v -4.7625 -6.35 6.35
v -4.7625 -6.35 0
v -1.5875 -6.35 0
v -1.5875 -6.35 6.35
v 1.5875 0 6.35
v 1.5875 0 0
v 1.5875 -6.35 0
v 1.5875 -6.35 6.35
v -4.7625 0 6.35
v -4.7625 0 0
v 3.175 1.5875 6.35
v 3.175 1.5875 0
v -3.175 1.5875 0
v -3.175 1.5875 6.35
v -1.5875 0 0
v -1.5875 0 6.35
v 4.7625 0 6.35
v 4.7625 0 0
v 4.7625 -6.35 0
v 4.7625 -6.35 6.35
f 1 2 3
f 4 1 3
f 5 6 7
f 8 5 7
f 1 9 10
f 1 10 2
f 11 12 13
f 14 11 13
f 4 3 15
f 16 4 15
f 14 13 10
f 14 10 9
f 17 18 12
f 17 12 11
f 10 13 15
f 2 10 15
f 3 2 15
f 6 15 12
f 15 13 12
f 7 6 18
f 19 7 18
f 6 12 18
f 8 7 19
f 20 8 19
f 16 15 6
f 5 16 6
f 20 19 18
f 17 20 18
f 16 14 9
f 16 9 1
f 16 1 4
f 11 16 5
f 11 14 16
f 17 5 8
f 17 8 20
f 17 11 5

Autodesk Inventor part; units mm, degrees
ref_plane "YZ Plane" through (0, 0, 0) normal (1, 0, 0) x (0, 1, 0)
ref_plane "XZ Plane" through (0, 0, 0) normal (0, 1, 0) x (-1, 0, 0)
ref_plane "XY Plane" through (0, 0, 0) normal (0, 0, 1) x (1, 0, 0)
sketch "Sketch1" plane through (0, 0, 0) normal (0, 0, 1) x (1, 0, 0)
  line L0 (-4.7625, -6.35) -> (-1.5875, -6.35)
  line L1 (-1.5875, -6.35) -> (-1.5875, 0)
  line L2 (-1.5875, 0) -> (1.5875, 0)
  line L3 (1.5875, 0) -> (1.5875, -6.35)
  line L4 (1.5875, -6.35) -> (4.7625, -6.35)
  line L5 (4.7625, -6.35) -> (4.7625, 1.5875)
  line L6 (4.7625, 1.5875) -> (-4.7625, 1.5875)
  line L7 (-4.7625, 1.5875) -> (-4.7625, -6.35)
  point P0 (0, 0)
  point P1 (0, 0)
  point P2 (0, 1.5875)
  dimension "d0" = 3.175
  dimension "d1" = 3.175
  dimension "d2" = 6.35
  dimension "d3" = 1.5875
extrude "Extrusion1" add sketch "Sketch1" along normal blind 6.35
chamfer "Chamfer1" distance 1.5875 angle 45 2 edges at (-4.7625, 1.5875, 3.175) (4.7625, 1.5875, 3.175)
properties part number "3DPRINT,WIRE-GUARD,LOOP"
